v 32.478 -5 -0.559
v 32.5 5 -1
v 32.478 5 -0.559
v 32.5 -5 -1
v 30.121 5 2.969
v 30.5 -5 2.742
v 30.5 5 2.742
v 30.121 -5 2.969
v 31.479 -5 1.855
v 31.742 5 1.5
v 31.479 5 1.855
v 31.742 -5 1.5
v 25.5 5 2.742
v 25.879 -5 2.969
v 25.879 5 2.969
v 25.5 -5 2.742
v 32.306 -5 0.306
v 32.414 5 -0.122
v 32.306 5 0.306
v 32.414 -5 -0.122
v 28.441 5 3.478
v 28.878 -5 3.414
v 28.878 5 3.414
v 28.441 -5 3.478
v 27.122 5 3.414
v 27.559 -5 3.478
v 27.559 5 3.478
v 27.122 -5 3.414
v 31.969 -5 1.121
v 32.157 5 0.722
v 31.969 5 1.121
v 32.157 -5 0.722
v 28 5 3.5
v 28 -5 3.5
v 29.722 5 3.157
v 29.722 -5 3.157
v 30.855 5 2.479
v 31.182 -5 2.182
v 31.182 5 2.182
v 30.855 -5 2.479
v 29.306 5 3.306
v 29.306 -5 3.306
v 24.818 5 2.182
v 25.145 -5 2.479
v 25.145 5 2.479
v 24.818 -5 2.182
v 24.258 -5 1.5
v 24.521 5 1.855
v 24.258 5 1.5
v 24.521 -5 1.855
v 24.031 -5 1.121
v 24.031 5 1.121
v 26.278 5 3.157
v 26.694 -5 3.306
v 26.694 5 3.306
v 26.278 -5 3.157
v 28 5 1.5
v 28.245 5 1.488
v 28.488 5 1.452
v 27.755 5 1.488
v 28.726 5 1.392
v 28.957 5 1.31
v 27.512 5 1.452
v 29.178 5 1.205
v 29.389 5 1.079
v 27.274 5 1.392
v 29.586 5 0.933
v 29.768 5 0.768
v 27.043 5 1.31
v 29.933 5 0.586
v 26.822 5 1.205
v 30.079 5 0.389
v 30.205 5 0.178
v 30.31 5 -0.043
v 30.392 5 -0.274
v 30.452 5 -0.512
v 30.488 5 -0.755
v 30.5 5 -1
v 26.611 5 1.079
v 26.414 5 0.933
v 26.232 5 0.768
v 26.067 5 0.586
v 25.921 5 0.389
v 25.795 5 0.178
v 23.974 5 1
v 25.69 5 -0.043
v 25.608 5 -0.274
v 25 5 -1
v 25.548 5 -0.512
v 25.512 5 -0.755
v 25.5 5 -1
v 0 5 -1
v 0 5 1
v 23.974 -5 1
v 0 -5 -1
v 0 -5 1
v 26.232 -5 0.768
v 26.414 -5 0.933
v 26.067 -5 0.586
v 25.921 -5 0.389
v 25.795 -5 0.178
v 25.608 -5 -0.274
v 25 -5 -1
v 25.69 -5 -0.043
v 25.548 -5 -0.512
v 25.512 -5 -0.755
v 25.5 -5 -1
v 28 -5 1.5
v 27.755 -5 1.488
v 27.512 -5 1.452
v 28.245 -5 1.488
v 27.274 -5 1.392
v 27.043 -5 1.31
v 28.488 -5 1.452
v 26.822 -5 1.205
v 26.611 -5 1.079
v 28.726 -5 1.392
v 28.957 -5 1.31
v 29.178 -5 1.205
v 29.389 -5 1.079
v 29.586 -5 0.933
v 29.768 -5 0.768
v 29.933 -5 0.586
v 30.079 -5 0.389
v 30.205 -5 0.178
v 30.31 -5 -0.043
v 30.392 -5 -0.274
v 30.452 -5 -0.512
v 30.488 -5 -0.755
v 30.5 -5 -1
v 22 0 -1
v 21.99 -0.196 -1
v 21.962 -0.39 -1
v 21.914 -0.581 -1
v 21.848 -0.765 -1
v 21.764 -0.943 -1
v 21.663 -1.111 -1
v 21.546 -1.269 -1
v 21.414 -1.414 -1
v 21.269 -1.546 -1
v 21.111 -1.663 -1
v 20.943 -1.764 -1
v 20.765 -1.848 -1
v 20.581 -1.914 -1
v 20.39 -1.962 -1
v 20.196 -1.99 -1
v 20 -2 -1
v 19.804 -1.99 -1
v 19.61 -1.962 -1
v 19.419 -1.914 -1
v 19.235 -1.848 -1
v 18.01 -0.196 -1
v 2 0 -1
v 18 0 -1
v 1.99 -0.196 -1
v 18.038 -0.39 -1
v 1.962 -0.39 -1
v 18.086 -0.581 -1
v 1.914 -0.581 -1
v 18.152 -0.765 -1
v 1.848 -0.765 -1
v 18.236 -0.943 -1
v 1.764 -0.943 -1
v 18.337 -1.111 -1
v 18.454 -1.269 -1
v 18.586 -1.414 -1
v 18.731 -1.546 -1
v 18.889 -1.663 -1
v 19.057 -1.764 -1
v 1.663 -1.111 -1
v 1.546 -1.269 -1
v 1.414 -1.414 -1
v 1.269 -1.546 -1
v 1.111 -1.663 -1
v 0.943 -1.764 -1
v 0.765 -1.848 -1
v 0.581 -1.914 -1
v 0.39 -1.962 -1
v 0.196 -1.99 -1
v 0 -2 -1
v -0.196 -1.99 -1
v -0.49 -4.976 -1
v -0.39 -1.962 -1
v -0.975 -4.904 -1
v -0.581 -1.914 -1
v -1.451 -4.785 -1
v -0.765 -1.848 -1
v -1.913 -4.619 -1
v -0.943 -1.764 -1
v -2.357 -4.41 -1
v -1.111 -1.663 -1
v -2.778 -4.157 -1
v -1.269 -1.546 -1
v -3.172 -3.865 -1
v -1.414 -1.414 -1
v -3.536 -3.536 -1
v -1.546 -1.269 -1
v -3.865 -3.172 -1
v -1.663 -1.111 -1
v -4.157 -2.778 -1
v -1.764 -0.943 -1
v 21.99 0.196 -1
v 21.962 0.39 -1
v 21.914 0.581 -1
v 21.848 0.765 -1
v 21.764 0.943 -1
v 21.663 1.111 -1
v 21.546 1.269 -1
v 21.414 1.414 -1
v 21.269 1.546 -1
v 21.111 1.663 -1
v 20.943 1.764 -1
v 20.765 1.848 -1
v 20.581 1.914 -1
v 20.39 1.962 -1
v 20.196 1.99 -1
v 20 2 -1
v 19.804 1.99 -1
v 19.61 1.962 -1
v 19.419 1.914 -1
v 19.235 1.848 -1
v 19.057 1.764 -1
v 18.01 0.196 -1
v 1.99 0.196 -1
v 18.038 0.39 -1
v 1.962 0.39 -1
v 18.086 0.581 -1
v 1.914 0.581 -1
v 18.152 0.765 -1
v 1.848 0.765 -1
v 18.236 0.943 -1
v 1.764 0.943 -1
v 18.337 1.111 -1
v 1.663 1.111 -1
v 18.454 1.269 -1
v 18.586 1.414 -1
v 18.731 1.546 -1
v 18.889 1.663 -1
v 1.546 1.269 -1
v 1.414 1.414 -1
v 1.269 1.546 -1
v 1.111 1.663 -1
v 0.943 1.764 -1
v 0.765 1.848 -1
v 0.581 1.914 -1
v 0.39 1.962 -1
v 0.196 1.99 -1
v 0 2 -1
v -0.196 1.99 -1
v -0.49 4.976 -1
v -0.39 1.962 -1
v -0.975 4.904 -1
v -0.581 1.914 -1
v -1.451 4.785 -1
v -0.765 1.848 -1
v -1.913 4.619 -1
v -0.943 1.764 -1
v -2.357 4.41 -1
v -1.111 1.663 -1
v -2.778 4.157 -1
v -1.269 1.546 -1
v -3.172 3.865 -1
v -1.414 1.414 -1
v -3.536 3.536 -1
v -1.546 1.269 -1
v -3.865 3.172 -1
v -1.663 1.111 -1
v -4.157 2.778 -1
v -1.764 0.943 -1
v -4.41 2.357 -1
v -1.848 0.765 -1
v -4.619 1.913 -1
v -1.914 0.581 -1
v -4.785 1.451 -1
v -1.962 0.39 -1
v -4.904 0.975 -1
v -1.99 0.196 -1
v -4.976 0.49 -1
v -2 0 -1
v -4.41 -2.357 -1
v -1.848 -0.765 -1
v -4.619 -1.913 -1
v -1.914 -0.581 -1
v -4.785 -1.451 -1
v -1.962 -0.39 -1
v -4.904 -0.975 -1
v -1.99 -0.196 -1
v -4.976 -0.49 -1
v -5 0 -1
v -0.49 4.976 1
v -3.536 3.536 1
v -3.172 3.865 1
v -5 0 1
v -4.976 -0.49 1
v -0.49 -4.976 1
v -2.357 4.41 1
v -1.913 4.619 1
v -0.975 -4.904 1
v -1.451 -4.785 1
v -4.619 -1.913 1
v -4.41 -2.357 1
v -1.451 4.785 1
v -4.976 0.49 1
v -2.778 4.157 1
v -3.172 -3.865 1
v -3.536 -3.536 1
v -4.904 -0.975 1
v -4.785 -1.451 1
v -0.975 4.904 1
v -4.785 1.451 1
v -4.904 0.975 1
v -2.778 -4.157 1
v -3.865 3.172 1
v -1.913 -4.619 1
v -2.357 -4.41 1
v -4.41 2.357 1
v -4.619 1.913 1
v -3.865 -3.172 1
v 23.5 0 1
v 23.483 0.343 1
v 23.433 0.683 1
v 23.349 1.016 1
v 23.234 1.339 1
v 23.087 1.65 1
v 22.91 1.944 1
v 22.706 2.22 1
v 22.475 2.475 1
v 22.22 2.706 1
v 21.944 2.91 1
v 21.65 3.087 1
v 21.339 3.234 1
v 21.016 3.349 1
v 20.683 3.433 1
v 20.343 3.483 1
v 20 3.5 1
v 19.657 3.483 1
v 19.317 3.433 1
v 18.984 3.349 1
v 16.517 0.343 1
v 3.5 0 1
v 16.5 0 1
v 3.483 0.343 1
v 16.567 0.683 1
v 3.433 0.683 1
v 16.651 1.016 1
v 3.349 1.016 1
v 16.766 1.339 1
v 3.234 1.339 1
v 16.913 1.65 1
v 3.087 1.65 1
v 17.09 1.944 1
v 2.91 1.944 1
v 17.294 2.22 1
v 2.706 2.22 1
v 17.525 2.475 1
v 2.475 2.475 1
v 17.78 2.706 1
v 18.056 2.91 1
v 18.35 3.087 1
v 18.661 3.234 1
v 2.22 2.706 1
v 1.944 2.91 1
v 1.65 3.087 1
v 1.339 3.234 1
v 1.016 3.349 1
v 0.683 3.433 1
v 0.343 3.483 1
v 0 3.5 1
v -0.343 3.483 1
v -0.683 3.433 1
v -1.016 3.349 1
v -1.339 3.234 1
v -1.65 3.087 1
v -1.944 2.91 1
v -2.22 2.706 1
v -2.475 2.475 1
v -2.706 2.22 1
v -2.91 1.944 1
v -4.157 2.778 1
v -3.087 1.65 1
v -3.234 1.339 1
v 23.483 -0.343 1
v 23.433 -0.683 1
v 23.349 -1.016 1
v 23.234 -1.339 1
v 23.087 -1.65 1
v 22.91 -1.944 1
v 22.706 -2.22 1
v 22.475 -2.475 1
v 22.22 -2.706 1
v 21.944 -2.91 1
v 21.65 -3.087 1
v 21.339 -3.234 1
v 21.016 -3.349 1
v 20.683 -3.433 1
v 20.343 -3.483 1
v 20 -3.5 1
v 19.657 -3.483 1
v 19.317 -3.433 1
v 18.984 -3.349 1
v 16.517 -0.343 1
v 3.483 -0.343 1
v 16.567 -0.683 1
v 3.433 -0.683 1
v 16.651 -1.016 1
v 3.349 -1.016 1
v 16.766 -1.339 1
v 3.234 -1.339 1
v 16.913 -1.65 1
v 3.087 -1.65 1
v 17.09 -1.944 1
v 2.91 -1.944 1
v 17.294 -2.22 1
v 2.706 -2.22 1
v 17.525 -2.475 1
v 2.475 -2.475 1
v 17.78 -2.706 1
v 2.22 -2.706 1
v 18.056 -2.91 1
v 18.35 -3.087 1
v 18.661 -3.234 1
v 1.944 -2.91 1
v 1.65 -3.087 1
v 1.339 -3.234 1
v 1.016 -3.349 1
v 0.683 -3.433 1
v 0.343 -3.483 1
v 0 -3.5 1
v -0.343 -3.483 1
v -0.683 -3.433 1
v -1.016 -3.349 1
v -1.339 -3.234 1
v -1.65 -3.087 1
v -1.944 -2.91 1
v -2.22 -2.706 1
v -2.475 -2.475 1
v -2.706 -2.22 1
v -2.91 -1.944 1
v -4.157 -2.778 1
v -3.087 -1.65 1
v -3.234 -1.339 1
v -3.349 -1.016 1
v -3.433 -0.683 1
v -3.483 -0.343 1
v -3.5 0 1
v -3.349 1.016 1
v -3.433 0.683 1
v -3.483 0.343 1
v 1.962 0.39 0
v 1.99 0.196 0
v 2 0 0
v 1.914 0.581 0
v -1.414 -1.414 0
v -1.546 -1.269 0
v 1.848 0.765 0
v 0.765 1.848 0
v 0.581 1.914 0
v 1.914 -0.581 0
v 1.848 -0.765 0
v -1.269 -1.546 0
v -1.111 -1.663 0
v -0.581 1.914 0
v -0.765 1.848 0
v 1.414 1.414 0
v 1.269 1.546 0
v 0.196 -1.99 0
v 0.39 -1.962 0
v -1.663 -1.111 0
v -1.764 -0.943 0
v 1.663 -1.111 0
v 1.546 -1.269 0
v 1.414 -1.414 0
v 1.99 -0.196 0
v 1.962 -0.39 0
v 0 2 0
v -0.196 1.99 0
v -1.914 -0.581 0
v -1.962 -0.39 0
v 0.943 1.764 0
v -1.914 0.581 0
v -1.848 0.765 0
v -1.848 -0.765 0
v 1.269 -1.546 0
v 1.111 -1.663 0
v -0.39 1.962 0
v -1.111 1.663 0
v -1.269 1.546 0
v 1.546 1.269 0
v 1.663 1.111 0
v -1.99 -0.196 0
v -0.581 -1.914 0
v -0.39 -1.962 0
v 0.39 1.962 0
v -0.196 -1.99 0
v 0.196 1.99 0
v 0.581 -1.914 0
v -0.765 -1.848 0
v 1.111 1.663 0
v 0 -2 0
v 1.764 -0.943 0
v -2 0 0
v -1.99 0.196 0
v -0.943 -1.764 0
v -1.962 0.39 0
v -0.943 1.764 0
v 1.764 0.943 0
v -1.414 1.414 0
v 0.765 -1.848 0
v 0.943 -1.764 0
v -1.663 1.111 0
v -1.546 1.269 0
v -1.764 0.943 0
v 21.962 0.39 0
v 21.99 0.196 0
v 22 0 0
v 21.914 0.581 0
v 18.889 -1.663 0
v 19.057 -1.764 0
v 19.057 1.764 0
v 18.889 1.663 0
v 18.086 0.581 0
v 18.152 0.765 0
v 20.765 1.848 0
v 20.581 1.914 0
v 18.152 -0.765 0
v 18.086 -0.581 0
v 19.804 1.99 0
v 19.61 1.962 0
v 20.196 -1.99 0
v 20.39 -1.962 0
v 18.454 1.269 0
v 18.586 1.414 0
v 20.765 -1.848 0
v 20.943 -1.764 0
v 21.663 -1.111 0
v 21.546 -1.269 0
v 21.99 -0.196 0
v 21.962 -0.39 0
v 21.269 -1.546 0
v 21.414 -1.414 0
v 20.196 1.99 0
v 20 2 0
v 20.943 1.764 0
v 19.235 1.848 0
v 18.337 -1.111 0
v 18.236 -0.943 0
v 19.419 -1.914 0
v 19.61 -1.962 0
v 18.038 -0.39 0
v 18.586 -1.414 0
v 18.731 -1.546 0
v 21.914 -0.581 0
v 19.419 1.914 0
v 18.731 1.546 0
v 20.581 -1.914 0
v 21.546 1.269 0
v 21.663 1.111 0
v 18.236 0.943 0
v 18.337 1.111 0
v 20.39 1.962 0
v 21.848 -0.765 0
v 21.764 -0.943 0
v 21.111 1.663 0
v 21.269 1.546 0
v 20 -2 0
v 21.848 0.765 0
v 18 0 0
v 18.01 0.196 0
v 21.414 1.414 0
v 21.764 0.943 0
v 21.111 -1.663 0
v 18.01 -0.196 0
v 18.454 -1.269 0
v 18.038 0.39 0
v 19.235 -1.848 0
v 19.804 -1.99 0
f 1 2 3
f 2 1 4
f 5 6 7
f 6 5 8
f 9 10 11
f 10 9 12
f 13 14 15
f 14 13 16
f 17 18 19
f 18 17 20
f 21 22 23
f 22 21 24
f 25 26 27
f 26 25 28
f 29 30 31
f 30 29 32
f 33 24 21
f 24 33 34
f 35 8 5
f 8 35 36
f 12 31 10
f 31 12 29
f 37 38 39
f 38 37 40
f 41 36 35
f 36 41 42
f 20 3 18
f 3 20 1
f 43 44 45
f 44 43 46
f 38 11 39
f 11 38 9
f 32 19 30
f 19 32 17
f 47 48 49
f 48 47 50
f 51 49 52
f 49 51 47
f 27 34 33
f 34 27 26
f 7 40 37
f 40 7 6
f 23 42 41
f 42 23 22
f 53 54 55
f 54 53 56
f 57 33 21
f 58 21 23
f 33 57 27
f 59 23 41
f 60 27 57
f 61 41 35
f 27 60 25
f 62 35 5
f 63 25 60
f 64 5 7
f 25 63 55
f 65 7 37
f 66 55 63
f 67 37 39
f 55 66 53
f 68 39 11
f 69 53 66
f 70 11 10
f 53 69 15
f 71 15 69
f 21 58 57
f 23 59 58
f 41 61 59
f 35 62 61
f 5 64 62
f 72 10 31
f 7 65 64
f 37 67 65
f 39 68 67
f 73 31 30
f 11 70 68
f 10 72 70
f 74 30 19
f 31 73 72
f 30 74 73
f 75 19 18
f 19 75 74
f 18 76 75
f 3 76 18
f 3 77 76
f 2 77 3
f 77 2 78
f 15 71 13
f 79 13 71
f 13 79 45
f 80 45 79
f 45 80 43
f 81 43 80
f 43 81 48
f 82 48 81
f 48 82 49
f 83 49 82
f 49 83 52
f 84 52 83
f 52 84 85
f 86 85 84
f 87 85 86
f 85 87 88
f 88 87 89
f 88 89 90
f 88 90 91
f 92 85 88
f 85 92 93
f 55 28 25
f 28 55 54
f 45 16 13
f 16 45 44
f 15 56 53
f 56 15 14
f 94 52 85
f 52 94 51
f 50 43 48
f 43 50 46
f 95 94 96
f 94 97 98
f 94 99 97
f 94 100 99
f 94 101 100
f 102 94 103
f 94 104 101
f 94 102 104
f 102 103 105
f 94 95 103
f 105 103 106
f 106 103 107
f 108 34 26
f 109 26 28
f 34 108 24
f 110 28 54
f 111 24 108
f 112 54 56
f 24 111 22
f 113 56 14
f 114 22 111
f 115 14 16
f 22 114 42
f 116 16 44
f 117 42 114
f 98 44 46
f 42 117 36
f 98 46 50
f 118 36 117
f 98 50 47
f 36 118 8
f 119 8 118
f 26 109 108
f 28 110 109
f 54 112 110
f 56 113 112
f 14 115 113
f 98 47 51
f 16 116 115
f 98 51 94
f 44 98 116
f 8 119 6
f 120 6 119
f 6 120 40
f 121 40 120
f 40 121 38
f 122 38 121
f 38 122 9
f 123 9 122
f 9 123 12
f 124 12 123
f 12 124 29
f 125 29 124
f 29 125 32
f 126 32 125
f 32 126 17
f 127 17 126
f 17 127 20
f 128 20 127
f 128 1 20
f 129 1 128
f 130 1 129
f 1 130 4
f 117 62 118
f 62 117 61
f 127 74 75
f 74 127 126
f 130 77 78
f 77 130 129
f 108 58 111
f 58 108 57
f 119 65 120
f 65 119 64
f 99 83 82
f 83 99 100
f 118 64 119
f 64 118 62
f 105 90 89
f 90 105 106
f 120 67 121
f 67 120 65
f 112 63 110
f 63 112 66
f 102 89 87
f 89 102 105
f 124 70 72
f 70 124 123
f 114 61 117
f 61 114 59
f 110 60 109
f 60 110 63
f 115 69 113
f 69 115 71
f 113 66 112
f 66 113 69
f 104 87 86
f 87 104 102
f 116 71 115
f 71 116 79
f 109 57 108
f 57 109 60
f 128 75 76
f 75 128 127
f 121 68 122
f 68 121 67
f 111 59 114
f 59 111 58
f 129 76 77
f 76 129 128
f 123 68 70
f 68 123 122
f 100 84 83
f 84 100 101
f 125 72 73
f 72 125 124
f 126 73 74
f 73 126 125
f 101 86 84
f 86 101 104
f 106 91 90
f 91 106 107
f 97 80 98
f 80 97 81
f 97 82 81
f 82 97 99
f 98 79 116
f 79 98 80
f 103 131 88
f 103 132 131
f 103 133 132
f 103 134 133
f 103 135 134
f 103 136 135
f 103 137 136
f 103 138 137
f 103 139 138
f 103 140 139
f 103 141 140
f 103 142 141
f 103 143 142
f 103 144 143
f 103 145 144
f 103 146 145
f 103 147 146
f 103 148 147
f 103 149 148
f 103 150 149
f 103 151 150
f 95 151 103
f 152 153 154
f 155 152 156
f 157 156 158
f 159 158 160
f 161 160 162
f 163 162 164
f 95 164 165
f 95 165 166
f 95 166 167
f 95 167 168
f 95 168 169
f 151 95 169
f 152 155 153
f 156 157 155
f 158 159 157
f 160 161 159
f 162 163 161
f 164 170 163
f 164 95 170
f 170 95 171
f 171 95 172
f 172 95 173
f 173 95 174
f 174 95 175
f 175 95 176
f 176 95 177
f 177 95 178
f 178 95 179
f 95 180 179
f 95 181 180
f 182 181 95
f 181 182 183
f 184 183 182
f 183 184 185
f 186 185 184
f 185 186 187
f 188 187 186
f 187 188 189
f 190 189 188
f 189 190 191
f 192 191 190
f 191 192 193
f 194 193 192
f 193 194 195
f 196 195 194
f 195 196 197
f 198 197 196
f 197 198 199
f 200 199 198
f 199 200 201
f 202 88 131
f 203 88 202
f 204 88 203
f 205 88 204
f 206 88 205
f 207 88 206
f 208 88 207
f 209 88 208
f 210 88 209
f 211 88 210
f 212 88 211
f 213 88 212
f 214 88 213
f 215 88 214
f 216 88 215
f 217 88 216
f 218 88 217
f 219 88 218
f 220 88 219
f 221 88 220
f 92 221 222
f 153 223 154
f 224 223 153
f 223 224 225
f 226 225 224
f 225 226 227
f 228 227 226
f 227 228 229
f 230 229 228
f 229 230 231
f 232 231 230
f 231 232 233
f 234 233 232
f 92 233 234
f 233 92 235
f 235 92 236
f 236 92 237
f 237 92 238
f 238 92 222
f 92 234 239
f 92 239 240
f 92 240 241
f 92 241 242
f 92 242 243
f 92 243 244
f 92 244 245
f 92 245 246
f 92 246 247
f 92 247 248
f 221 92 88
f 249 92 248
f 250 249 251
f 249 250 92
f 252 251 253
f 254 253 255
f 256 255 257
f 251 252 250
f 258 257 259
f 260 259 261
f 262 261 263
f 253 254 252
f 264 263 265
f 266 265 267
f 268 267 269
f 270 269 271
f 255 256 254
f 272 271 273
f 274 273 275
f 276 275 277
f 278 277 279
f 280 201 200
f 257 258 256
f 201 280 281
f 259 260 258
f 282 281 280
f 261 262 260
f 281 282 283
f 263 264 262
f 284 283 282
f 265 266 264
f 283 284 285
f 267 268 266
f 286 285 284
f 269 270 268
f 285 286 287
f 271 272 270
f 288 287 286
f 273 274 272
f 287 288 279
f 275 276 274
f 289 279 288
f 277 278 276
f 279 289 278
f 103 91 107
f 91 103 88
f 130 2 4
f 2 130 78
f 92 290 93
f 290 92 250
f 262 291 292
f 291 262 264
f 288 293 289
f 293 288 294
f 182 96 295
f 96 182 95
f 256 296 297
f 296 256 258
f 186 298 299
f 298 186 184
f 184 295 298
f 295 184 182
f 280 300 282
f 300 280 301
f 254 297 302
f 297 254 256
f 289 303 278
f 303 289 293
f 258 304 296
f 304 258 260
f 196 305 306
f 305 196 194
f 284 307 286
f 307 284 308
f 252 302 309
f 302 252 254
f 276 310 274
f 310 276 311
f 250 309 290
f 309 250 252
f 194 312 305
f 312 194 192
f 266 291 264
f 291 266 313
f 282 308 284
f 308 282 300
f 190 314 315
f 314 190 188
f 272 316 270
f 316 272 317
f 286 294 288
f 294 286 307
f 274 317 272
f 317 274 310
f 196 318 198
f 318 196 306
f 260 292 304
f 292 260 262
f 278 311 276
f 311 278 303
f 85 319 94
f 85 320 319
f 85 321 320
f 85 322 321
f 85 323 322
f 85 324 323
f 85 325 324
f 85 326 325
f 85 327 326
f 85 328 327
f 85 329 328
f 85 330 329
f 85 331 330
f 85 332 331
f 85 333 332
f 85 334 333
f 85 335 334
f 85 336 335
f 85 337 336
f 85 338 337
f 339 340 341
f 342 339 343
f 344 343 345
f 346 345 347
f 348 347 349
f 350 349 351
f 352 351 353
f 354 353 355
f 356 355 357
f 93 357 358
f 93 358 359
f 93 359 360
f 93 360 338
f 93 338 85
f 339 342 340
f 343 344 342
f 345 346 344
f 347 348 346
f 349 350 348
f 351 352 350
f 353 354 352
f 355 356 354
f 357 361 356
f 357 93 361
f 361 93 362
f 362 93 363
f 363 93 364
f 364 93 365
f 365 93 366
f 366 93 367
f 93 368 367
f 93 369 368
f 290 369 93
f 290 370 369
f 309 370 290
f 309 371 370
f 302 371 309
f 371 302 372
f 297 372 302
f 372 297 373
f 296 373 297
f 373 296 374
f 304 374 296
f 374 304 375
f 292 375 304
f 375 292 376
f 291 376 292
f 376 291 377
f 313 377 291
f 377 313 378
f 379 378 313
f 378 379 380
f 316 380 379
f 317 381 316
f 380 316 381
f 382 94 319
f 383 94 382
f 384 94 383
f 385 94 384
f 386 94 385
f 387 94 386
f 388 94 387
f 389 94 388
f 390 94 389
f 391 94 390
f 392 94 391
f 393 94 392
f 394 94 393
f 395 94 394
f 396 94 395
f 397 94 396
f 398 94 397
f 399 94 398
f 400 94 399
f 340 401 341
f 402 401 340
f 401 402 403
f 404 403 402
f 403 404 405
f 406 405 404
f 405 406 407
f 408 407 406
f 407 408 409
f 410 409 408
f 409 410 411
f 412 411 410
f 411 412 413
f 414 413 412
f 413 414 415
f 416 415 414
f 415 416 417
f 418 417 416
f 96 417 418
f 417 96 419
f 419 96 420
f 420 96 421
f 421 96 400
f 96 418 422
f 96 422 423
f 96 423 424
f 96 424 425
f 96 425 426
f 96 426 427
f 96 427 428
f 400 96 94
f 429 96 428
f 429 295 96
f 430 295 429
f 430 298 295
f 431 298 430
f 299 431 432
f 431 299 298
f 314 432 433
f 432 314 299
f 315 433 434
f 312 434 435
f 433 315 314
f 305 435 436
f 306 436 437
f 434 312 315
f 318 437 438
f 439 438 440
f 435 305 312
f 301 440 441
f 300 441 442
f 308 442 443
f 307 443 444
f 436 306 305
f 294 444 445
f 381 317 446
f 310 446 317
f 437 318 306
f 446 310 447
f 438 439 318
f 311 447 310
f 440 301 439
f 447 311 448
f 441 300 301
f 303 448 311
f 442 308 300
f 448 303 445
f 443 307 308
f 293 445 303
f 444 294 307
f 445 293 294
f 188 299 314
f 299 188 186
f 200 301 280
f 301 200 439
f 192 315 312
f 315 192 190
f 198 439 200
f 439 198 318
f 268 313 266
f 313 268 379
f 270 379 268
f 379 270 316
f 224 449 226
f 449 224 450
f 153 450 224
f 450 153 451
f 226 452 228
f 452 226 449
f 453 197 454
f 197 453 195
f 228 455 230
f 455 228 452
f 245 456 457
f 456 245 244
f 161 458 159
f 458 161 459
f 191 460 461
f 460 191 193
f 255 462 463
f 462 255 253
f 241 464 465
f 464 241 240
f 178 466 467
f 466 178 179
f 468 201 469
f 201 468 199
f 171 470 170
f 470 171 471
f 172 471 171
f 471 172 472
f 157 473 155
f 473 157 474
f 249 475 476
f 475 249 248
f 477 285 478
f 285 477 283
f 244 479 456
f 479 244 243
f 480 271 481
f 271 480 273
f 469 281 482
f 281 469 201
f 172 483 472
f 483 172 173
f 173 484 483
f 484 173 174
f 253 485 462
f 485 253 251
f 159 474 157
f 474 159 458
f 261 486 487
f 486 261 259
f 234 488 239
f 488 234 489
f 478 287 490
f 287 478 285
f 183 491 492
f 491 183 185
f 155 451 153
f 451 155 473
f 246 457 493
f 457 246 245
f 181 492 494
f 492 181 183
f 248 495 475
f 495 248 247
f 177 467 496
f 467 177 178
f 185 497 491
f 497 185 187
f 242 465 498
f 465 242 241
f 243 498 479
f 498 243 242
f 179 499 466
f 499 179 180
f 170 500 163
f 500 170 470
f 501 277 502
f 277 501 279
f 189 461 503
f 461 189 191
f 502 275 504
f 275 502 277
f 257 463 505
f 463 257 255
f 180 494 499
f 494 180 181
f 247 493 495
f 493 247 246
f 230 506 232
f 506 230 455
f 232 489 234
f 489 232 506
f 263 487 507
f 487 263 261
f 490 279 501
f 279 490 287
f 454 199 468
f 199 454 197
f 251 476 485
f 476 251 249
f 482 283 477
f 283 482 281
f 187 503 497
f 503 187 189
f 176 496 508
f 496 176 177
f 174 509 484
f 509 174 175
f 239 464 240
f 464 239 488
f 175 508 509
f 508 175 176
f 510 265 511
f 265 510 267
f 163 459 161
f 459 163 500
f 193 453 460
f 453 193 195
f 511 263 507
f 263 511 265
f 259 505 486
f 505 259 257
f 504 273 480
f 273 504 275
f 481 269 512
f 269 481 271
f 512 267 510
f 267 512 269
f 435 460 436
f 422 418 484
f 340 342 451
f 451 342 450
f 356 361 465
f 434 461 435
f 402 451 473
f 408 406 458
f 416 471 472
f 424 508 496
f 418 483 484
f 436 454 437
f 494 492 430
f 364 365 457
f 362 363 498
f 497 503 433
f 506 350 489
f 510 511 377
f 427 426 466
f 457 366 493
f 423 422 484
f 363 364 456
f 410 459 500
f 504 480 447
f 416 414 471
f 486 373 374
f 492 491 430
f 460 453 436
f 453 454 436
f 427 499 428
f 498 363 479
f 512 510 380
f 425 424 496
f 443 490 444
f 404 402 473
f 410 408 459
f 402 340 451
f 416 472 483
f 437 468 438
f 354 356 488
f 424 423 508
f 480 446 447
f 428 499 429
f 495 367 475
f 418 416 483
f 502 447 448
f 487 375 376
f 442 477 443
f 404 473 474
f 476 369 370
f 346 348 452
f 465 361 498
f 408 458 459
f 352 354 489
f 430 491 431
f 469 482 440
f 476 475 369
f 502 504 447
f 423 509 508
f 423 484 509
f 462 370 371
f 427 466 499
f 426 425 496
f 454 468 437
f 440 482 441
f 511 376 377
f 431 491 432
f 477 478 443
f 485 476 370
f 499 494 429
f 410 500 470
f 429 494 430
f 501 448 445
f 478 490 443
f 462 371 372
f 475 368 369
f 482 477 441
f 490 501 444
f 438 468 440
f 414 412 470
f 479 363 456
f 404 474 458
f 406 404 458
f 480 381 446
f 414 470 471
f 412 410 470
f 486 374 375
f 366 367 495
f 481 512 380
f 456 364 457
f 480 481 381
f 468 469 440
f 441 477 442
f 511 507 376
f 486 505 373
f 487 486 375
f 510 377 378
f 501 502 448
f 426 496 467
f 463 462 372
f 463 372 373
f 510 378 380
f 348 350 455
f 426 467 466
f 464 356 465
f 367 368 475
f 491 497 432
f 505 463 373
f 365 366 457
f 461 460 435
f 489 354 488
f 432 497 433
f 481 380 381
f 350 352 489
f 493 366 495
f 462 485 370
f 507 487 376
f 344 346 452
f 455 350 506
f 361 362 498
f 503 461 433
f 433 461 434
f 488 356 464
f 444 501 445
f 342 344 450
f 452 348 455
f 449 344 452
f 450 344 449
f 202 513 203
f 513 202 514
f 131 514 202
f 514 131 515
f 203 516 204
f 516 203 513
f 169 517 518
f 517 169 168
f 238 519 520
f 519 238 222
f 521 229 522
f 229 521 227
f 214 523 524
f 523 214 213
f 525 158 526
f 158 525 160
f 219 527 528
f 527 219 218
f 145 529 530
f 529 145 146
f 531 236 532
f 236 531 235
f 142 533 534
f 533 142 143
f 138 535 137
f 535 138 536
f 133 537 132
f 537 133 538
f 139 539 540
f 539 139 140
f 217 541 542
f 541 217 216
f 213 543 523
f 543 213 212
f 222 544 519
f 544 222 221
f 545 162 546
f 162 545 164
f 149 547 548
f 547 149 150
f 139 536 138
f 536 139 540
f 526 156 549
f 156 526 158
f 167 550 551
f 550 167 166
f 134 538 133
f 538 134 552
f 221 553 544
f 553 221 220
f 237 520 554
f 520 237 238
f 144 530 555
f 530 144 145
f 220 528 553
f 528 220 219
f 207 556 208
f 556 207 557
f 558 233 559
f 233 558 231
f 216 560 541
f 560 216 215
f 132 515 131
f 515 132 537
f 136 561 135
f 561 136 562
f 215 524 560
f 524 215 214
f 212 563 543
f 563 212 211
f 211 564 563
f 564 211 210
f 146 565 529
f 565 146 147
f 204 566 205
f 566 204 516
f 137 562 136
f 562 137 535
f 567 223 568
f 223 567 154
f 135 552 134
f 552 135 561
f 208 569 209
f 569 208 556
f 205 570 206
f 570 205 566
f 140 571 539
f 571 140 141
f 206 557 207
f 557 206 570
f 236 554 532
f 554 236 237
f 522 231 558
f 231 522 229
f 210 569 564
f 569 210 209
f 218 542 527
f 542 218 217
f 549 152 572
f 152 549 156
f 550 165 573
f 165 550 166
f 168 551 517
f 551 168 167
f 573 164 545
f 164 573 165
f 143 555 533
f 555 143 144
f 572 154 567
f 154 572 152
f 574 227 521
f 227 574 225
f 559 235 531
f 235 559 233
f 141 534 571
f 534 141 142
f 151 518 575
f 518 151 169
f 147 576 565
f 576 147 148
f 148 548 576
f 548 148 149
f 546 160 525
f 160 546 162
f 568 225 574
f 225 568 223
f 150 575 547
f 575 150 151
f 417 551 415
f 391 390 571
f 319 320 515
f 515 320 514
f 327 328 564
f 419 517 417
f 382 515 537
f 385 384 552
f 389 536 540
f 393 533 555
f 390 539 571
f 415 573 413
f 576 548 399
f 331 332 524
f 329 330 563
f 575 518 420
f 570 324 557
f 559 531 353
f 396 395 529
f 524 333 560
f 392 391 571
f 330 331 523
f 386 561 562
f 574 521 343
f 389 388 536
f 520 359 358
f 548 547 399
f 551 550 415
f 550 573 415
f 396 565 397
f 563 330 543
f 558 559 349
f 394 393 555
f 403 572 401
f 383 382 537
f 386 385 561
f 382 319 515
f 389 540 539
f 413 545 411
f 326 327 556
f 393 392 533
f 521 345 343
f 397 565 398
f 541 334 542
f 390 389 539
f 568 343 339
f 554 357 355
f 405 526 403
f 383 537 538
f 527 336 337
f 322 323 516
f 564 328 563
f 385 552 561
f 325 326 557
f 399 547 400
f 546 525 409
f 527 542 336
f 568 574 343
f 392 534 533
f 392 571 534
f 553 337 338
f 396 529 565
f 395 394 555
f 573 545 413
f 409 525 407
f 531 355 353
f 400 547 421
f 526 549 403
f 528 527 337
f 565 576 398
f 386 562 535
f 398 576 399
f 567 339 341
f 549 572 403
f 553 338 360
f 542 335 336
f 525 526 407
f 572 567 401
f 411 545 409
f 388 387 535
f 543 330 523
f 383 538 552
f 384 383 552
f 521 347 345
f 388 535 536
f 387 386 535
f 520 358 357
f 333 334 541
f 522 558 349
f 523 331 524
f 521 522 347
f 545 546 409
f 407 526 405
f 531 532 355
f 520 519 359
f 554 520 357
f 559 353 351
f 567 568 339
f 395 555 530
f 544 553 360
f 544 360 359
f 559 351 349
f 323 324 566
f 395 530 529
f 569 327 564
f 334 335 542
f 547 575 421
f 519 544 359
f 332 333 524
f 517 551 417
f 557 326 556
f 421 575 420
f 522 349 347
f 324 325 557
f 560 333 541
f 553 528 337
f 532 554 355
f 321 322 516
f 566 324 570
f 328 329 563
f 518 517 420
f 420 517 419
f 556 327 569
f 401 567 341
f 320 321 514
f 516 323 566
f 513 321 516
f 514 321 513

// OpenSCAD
h=2; //[0.5:0.5:10]
w=10;//[1:1:50]
l=30;//[1:1:150]
d=5;//[0.5:0.1:15]
screw_d=4;//[0.5:0.1:15]
screw_head_d=7;//[0.5:0.1:15]
screw_head_h=1;//[0.5:0.1:15]
$fn=64;
render()difference(){
  union(){
    hull(){
      cylinder(d=w,h=h,center=true);
      translate([l-w,0,0])cube([w,w,h],center=true);
    }
    difference(){
      translate([l-h,0,-h/2])rotate([-90,0,0])cylinder(d=d+2*h,h=w,center=true);
      translate([l-h,0,-h/2])rotate([-90,0,0])cylinder(d=d,h=w,center=true);
      translate([0,0,-h-d/2])cube([2*(l+d),l,h+d],center=true);
    }
  }
  for(a=[0,1])translate([a*(l-w),0,0]){
    cylinder(d=screw_d,h=h,center=true);
    translate([0,0,(h-screw_head_h)/2])cylinder(d1=screw_d,d2=screw_head_d,h=screw_head_h,center=true);
  }
}
